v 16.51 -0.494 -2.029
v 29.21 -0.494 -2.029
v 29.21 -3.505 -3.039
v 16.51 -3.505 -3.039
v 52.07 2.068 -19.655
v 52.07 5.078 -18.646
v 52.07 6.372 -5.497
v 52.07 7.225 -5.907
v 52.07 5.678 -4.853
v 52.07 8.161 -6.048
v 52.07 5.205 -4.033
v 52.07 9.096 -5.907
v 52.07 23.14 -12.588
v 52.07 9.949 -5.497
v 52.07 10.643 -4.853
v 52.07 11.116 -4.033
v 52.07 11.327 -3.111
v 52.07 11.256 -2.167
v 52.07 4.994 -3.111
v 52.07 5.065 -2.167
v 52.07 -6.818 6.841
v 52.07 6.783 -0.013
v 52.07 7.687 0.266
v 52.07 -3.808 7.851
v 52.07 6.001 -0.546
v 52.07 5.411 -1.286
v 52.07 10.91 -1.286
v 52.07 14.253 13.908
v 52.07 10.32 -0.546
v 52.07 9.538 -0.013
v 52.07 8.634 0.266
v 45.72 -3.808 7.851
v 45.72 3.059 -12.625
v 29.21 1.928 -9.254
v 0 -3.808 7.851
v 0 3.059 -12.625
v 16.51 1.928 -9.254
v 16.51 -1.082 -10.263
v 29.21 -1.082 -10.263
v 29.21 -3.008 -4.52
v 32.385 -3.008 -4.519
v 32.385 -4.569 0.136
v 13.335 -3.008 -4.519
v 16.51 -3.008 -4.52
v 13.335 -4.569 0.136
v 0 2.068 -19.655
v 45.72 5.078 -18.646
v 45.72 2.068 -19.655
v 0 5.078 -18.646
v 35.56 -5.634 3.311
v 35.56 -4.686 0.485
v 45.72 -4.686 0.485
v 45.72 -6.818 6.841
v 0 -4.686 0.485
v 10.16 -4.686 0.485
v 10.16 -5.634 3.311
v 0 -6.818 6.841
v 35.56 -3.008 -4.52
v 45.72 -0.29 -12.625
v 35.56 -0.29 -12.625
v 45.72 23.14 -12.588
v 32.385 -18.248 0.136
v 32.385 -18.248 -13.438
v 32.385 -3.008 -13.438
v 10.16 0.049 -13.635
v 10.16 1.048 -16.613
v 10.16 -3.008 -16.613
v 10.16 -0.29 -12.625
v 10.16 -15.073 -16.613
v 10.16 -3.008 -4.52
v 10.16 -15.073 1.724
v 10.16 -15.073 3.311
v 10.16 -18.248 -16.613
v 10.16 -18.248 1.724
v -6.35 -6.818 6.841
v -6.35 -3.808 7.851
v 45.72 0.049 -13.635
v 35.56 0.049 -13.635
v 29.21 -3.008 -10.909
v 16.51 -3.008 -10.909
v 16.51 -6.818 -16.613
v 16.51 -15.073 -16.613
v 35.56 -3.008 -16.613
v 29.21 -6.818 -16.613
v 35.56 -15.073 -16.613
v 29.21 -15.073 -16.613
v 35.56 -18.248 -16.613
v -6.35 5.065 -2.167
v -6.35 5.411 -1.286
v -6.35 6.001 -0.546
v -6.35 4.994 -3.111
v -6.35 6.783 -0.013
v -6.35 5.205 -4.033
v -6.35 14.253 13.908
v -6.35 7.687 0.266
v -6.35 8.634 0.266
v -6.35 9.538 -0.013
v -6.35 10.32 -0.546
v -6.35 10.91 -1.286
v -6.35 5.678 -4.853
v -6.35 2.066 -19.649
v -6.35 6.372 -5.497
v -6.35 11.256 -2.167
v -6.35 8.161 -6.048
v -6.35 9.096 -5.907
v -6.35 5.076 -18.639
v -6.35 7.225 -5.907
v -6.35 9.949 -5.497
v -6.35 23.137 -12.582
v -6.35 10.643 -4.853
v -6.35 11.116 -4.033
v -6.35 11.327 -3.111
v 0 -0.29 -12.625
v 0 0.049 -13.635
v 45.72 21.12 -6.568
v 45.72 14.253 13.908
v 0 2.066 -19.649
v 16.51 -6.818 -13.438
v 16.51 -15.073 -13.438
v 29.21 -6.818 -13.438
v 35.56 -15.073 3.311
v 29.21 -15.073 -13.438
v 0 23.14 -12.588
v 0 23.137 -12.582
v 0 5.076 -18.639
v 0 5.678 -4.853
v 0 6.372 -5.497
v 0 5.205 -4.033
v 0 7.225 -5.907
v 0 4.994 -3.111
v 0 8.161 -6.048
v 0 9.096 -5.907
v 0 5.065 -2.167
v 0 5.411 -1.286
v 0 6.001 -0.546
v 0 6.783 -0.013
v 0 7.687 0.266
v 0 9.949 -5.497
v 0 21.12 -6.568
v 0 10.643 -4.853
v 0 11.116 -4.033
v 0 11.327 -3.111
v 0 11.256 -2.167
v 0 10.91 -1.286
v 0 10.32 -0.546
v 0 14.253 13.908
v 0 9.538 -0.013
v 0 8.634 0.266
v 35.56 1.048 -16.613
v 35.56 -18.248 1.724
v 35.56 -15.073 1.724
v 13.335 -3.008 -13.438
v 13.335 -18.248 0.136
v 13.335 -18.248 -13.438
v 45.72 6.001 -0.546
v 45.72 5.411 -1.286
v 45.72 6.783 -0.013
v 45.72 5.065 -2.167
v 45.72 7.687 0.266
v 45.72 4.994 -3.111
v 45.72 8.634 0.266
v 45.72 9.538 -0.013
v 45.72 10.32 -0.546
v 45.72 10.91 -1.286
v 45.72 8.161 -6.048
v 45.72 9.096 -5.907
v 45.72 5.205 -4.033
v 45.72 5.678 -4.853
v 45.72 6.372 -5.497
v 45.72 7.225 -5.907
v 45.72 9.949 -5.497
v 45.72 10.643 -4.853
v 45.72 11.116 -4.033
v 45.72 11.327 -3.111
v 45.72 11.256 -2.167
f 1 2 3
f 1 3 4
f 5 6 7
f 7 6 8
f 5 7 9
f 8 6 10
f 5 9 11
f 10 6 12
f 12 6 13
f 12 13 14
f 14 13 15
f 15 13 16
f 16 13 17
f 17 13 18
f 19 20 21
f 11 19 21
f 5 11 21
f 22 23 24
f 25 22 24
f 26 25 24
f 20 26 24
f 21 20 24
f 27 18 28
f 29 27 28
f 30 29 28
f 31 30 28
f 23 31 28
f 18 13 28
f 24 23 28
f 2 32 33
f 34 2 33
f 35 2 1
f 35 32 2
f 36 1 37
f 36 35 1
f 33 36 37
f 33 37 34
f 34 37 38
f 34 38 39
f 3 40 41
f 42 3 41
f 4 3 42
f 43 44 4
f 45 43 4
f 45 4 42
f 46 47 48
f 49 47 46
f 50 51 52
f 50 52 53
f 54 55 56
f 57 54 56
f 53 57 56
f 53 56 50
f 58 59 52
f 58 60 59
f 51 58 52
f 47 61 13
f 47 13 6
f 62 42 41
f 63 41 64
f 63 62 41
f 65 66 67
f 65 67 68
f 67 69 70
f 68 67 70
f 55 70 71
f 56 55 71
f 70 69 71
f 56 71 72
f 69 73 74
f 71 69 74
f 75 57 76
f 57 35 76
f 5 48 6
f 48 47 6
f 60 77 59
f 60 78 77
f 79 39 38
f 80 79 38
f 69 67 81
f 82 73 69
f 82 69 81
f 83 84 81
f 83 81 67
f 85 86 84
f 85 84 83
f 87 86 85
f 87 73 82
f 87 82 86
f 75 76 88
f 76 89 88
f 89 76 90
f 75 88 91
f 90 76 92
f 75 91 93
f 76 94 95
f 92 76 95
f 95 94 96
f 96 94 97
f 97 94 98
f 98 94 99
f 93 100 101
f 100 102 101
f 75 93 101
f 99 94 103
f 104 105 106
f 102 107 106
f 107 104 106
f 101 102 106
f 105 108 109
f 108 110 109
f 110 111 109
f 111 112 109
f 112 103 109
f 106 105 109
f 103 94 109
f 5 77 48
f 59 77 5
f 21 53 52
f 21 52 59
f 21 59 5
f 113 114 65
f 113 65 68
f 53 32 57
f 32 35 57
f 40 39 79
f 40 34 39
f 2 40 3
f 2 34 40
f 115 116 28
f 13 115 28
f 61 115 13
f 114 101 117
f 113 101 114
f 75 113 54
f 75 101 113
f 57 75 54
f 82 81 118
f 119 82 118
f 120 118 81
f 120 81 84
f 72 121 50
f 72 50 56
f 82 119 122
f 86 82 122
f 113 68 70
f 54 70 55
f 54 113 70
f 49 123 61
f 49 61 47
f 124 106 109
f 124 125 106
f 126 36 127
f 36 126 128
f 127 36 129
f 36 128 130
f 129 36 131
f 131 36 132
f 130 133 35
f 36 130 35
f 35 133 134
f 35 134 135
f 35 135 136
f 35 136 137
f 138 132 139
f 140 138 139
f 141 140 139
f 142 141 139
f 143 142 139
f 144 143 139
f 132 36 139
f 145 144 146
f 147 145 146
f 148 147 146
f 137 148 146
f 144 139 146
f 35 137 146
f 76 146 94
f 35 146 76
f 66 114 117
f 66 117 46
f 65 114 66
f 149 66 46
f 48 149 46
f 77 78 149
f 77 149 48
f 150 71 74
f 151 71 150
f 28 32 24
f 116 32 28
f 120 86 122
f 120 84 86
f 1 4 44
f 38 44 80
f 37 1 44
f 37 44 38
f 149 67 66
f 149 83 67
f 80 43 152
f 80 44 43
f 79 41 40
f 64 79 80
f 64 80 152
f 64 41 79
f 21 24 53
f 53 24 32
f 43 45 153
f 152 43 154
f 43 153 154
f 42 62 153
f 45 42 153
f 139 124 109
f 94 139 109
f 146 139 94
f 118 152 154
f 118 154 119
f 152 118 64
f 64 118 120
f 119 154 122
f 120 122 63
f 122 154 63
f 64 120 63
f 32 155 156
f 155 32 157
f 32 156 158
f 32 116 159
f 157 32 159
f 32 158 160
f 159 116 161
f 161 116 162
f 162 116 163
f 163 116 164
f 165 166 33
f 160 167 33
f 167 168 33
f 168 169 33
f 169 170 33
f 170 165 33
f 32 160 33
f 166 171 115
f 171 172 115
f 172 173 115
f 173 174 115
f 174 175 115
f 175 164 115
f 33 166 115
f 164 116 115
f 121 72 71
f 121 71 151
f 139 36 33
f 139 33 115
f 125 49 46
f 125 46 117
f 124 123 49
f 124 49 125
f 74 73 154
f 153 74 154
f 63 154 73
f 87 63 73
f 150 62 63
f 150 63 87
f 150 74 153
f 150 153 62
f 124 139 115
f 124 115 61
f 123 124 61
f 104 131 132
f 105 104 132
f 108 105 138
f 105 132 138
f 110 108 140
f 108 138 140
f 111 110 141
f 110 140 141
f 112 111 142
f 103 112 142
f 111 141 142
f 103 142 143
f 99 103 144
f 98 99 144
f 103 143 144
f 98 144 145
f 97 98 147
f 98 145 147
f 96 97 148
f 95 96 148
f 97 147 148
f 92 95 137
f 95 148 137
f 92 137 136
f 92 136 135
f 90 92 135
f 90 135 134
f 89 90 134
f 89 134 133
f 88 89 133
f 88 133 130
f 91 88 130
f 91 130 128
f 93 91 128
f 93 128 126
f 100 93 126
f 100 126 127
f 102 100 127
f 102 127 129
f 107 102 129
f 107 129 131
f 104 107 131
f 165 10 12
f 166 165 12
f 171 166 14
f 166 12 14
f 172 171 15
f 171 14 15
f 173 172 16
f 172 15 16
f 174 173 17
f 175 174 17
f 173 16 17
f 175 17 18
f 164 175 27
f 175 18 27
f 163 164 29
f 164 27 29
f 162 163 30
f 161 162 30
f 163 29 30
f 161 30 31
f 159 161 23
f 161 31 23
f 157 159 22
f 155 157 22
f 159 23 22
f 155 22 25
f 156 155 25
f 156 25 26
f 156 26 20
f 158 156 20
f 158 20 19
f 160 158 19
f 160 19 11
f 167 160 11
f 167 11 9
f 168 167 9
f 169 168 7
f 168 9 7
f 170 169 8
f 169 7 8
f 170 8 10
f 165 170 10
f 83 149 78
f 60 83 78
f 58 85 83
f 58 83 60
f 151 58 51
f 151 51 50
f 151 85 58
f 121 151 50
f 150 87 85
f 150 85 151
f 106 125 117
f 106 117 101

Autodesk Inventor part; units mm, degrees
ref_plane "YZ Plane" through (0, 0, 0) normal (1, 0, 0) x (0, 1, 0)
ref_plane "XZ Plane" through (0, 0, 0) normal (0, 1, 0) x (-1, 0, 0)
sketch "Sketch8" plane through (0, 0, 0) normal (1, 0, 0) x (0, 1, 0)
  line L0 (-3.8078, 7.851) -> (3.0591, -12.6251)
  line L1 (-0.2897, -12.6251) -> (-4.6863, 0.485)
  line L2 (3.0591, -12.6251) -> (-0.2897, -12.6251)
  line L3 (-4.6863, 0.485) -> (-6.818, 6.8414)
  line L4 (-3.8078, 7.851) -> (-6.818, 6.8414)
  point P0 (0, 0)
extrude "Extrusion6" add sketch "Sketch8" along normal blind 45.72
sketch "Sketch11" plane through (0, 0, 0) normal (-1, 0, 0) x (0, 0, 1)
  line L0 (0.485, -4.6863) -> (-12.6251, -0.2897) projected
  line L1 (7.851, -6.8159) -> (0.485, -6.8159) projected
  line L2 (7.851, -6.8159) -> (0.485, -6.8159)
  line L3 (0.485, -6.8159) -> (0.485, -4.6863)
  line L4 (-12.6251, -0.2897) -> (0.485, -4.6863)
  line L5 (7.851, -3.8078) -> (-12.6251, 3.0591) projected
  line L6 (0.485, -6.8159) -> (7.851, -6.8159) projected
  line L7 (13.9082, 14.2533) -> (7.851, -3.808)
  line L8 (7.851, -3.808) -> (-18.639, 5.076)
  line L9 (-18.639, 5.076) -> (-12.5817, 23.1373)
  line L10 (-12.5817, 23.1373) -> (13.9082, 14.2533)
  point P0 (0, 0)
  dimension "d73" = 27.94
  dimension "d74" = 18.54
  dimension "d76" = 0
  dimension "d88" = 19.05
extrude "Extrusion8" add sketch "Sketch11" along normal blind 6.35
sketch "Sketch13" plane through (0, -3.8078, 7.851) normal (0, 0.9481042, 0.3179598) x (1, 0, 0)
  line L0 (0, 0) -> (0, 21.5968) projected
  line L1 (16.51, 18.0408) -> (29.21, 18.0408)
  line L2 (29.21, 18.0408) -> (29.21, 10.4208)
  line L3 (29.21, 10.4208) -> (16.51, 10.4208)
  line L4 (16.51, 10.4208) -> (16.51, 18.0408)
  point P0 (0, 8.6543)
  dimension "d55" = 7.62
  dimension "d56" = 12.7
  dimension "d57" = 16.51
extrude "Extrusion10" cut sketch "Sketch13" against normal blind 25.4
sketch "Sketch15" plane through (0, 0, 0) normal (1, 0, 0) x (0, 0, -1)
  line L0 (-0.485, -6.8159) -> (-7.851, -6.8159) projected
  line L1 (6.5678, 21.1205) -> (12.5883, 23.1395)
  line L2 (12.5883, 23.1395) -> (18.6455, 5.0782)
  line L3 (18.6455, 5.0782) -> (12.6251, 3.0591)
  line L4 (12.6251, 3.0591) -> (6.5678, 21.1205)
  dimension "d67" = 6.35
  dimension "d68" = 18.54
  dimension "d69" = 0
  dimension "d70" = 0
  dimension "d87" = 19.05
extrude "Extrusion11" add sketch "Sketch15" along normal blind 45.72
sketch "Sketch17" plane through (45.72, 0, 0) normal (1, 0, 0) x (0, 0, -1)
  line L0 (-7.851, -3.808) -> (-13.9082, 14.2533) projected
  line L1 (-7.851, -3.808) -> (-13.9082, 14.2533)
  line L2 (-13.9082, 14.2533) -> (12.5883, 23.1395)
  line L3 (12.5883, 23.1395) -> (18.6456, 5.0782)
  line L4 (18.6456, 5.0782) -> (-7.851, -3.808)
  point P0 (0, 0)
extrude "Extrusion12" add sketch "Sketch17" along normal blind 6.35
sketch "Sketch19" plane through (45.72, 5.0782, -18.6456) normal (0, -0.9481019, -0.3179666) x (1, 0, 0)
  line L0 (0, 6.3501) -> (0, 0.0001) projected
  line L1 (6.35, 27.947) -> (0, 27.947)
  line L2 (0, 27.947) -> (0, 0.0001)
  line L3 (0, 0.0001) -> (6.35, 0.0001)
  line L4 (6.35, 0.0001) -> (6.35, 27.947)
  line L5 (-45.72, 6.3501) -> (0, 6.3501) projected
  line L6 (0, 0.0001) -> (0, 0.0001)
  line L7 (0, 0.0001) -> (0, 6.3501)
  line L8 (0, 6.3501) -> (0, 6.3501)
  line L9 (0, 6.3501) -> (0, 0.0001)
  line L10 (-45.72, 0.007) -> (-52.07, 0.007) projected
  line L11 (-52.07, 0.007) -> (-45.72, 0.007)
  line L12 (-45.72, 0.007) -> (-45.72, 27.947)
  line L13 (-45.72, 27.947) -> (-52.07, 27.947)
  line L14 (-52.07, 27.947) -> (-52.07, 0.007)
  point P0 (-45.72, 19.2926)
extrude "Extrusion13" add sketch "Sketch19" along normal blind 3.175
sketch "Sketch20" plane through (0, 5.0782, -18.6455) normal (0, -0.9481019, -0.3179666) x (1, 0, 0)
  line L0 (45.72, 0) -> (0, 0)
  line L1 (0, 0) -> (0, 6.35)
  line L2 (0, 6.35) -> (45.72, 6.35)
  line L3 (45.72, 6.35) -> (45.72, 0)
  point P0 (0, 19.2926)
extrude "Extrusion14" add sketch "Sketch20" along normal blind 3.175
sketch "Sketch21" plane through (0, 0, 0) normal (1, 0, 0) x (0, 0, -1)
  line L0 (19.6485, 2.0658) -> (13.6346, 0.0489) projected
  line L1 (13.6346, 0.0489) -> (12.6251, 3.0591) projected
  line L2 (12.6251, 3.0591) -> (12.6251, -0.2897) projected
  line L3 (12.6251, -0.2897) -> (-6.8414, -6.818) projected
  line L4 (-0.485, -4.6863) -> (-0.485, -4.6865) projected
  line L5 (19.6485, 2.0657) -> (-6.8414, -6.8182) projected
  line L6 (19.6485, 2.0657) -> (19.6485, 2.0658) projected
  line L7 (12.6251, 3.0591) -> (13.6346, 0.0489)
  line L8 (12.6251, -0.2897) -> (13.6346, 0.0489)
  line L9 (12.6251, 3.0591) -> (12.6251, -0.2897)
  point P0 (0, 0)
  point P1 (-6.8415, -6.8181)
extrude "Extrusion15" add sketch "Sketch21" along normal blind 45.72
sketch "Sketch22" plane through (16.51, -1.0818, -10.2631) normal (0, 0.9481042, 0.3179598) x (1, 0, 0)
  line L0 (12.7, -7.62) -> (12.7, 0) projected
  line L1 (12.7, 0) -> (0, 0) projected
  line L2 (0, 0) -> (12.7, 0)
  line L3 (12.7, 0) -> (12.7, -7.62)
  line L4 (12.7, -7.62) -> (0, -7.62)
  line L5 (0, -7.62) -> (0, 0)
  point P0 (-16.51, -9.3866)
extrude "Extrusion16" cut sketch "Sketch22" against normal blind 45.72
sketch "Sketch23" plane through (52.07, 0, 0) normal (1, 0, 0) x (0, 0, -1)
  circle A0 centre (2.8734, 8.1606) radius 3.175
  point P0 (0, 0)
  dimension "d89" = 6.35
extrude "Extrusion17" cut sketch "Sketch23" against normal blind 76.2
ref_plane "Work Plane1" through (0, -6.818, 6.8414) normal (0, -1, 0) x (1, 0, 0)
sketch "Sketch25" plane through (0, -6.818, 6.8414) normal (0, -1, 0) x (1, 0, 0)
  line L0 (35.56, -20.2796) -> (35.56, -3.5301)
  line L1 (35.56, -3.5301) -> (32.385, -3.5301)
  line L2 (32.385, -3.5301) -> (32.385, -20.2796)
  line L3 (32.385, -6.7051) -> (10.16, -6.7051)
  line L4 (10.16, -6.7051) -> (10.16, -3.5301)
  line L5 (10.16, -3.5301) -> (32.385, -3.5301)
  line L6 (32.385, -3.5301) -> (32.385, -6.7051)
  line L7 (10.16, -6.7051) -> (13.335, -6.7051)
  line L8 (13.335, -6.7051) -> (13.335, -20.2796)
  line L9 (10.16, -20.2796) -> (10.16, -6.7051)
  line L10 (13.335, -20.2796) -> (32.385, -20.2796)
  line L11 (32.385, -20.2796) -> (32.385, -23.4546)
  line L12 (32.385, -23.4546) -> (13.335, -23.4546)
  line L13 (13.335, -23.4546) -> (13.335, -20.2796)
  line L14 (29.21, -17.1046) -> (16.51, -17.1046) projected
  line L15 (29.21, -9.8801) -> (29.21, -17.1046) projected
  line L16 (16.51, -9.8801) -> (29.21, -9.8801) projected
  line L17 (16.51, -17.1046) -> (16.51, -9.8801) projected
  line L18 (32.385, -23.4546) -> (35.56, -23.4546)
  line L19 (35.56, -23.4546) -> (35.56, -3.5301)
  line L20 (35.56, -3.5301) -> (32.385, -3.5301)
  line L21 (32.385, -3.5301) -> (32.385, -23.4546)
  line L22 (32.385, -3.5301) -> (10.16, -3.5301)
  line L23 (10.16, -3.5301) -> (10.16, -6.7051)
  line L24 (10.16, -6.7051) -> (32.385, -6.7051)
  line L25 (32.385, -6.7051) -> (32.385, -3.5301)
  line L26 (10.16, -6.7051) -> (13.335, -6.7051)
  line L27 (13.335, -6.7051) -> (13.335, -23.4546)
  line L28 (13.335, -23.4546) -> (10.16, -23.4546)
  line L29 (10.16, -23.4546) -> (10.16, -6.7051)
  line L30 (32.385, -20.2796) -> (13.335, -20.2796)
  line L31 (13.335, -20.2796) -> (13.335, -23.4546)
  line L32 (13.335, -23.4546) -> (32.385, -23.4546)
  line L33 (32.385, -23.4546) -> (32.385, -20.2796)
  line L34 (35.56, -3.5301) -> (32.385, -3.5301)
  line L35 (32.385, -3.5301) -> (32.385, -23.4546)
  line L36 (32.385, -23.4546) -> (35.56, -23.4546)
  line L37 (35.56, -23.4546) -> (35.56, -3.5301)
  point P0 (0, -6.8414)
  dimension "d102" = 3.175
  dimension "d103" = 3.175
  dimension "d104" = 3.175
  dimension "d105" = 3.175
  dimension "d106" = 3.175
  dimension "d107" = 3.175
  dimension "d108" = 3.175
  dimension "d109" = 3.175
extrude "Extrusion18" add sketch "Sketch25" against normal blind 3.81 contours L19 L18 L11 L2 L1 L0 | L2 L3 L4 L5 | L12 L13 L10 L11 | L28 L29 L9 L3 L8 L13
sketch "Sketch26" plane through (35.56, -6.818, 3.3114) normal (1, 0, 0) x (0, 0, -1)
  line L0 (7.8311, 3.81) -> (19.9245, 3.81) projected
  line L1 (7.8311, 3.81) -> (19.9245, 3.81)
  line L2 (19.9245, 3.81) -> (19.9245, 7.8658)
  line L3 (19.9245, 7.8658) -> (7.8311, 3.81)
  point P0 (3.3114, 6.818)
extrude "Extrusion19" add sketch "Sketch26" against normal blind 25.4
sketch "Sketch27" plane through (16.51, -1.0818, -10.2632) normal (0, 0.9481013, 0.3179684) x (1, 0, 0)
  line L0 (0, -6.0578) -> (12.7, -6.0578)
  line L1 (12.7, -6.0578) -> (12.7, 0)
  line L2 (12.7, 0) -> (0, 0)
  line L3 (0, 0) -> (0, -6.0578)
  point P0 (-16.51, -9.3865)
extrude "Extrusion20" cut sketch "Sketch27" against normal blind 25.4
sketch "Sketch28" plane through (0, -6.818, 6.8414) normal (0, -1, 0) x (1, 0, 0)
  line L0 (10.16, -3.5301) -> (10.16, -23.4546) projected
  line L1 (35.56, -23.4546) -> (35.56, -3.5301) projected
  line L2 (35.56, -3.5301) -> (10.16, -3.5301) projected
  line L3 (32.385, -6.7051) -> (13.335, -6.7051) projected
  line L4 (32.385, -6.7051) -> (32.385, -20.2796) projected
  line L5 (32.385, -20.2796) -> (13.335, -20.2796) projected
  line L6 (13.335, -20.2796) -> (13.335, -6.7051) projected
  line L7 (35.56, -23.4546) -> (29.21, -23.4546)
  line L8 (29.21, -23.4546) -> (29.21, -20.2796)
  line L9 (29.21, -20.2796) -> (35.56, -20.2796)
  line L10 (35.56, -20.2796) -> (35.56, -23.4546)
  line L11 (10.16, -23.4546) -> (16.51, -23.4546)
  line L12 (16.51, -23.4546) -> (16.51, -20.2796)
  line L13 (16.51, -20.2796) -> (10.16, -20.2796)
  line L14 (10.16, -20.2796) -> (10.16, -23.4546)
  line L15 (13.335, -6.7051) -> (13.335, -11.3612) projected
  line L16 (10.16, -20.2796) -> (13.335, -20.2796)
  line L17 (13.335, -20.2796) -> (13.335, -6.7051)
  line L18 (13.335, -6.7051) -> (10.16, -6.7051)
  line L19 (10.16, -6.7051) -> (10.16, -20.2796)
  line L20 (10.16, -3.5301) -> (35.56, -3.5301) projected
  line L21 (10.16, -6.7051) -> (35.56, -6.7051)
  line L22 (35.56, -6.7051) -> (35.56, -3.5301)
  line L23 (35.56, -3.5301) -> (10.16, -3.5301)
  line L24 (10.16, -3.5301) -> (10.16, -6.7051)
  line L25 (35.56, -6.7051) -> (32.385, -6.7051)
  line L26 (32.385, -6.7051) -> (32.385, -20.2796)
  line L27 (32.385, -20.2796) -> (35.56, -20.2796)
  line L28 (35.56, -20.2796) -> (35.56, -6.7051)
  point P0 (0, -6.8414)
  dimension "d116" = 6.35
  dimension "d117" = 6.35
extrude "Extrusion21" add sketch "Sketch28" along normal blind 8.255 contours L2 L1 L21 L3 L18 L0 | L18 L6 L13 L0 | L13 L5 L12 L11 L0 | L1 L9 L4 L21 | L1 L7 L8 L5 L9
sketch "Sketch29" plane through (0, -15.073, 6.8414) normal (0, -1, 0) x (1, 0, 0)
  line L0 (35.56, -6.3565) -> (35.56, -23.4546) projected
  line L1 (10.16, -23.4546) -> (35.56, -23.4546)
  line L2 (35.56, -23.4546) -> (35.56, -20.2796)
  line L3 (35.56, -20.2796) -> (10.16, -20.2796)
  line L4 (10.16, -20.2796) -> (10.16, -23.4546)
  line L5 (10.16, -23.4546) -> (10.16, -6.3565) projected
  line L6 (10.16, -6.7051) -> (35.56, -6.7051)
  line L7 (35.56, -6.7051) -> (32.385, -6.7051)
  line L8 (32.385, -6.7051) -> (32.385, -20.2796)
  line L9 (32.385, -20.2796) -> (35.56, -20.2796)
  line L10 (35.56, -20.2796) -> (35.56, -6.7051)
  line L11 (13.335, -6.7051) -> (10.16, -6.7051)
  line L12 (10.16, -6.7051) -> (10.16, -20.2796)
  line L13 (10.16, -20.2796) -> (13.335, -20.2796)
  line L14 (13.335, -20.2796) -> (13.335, -6.7051)
  line L15 (10.16, -6.3565) -> (10.16, -3.5301) projected
  line L16 (35.56, -6.7051) -> (10.16, -6.7051)
  line L17 (10.16, -6.7051) -> (10.16, -5.1176)
  line L18 (10.16, -5.1176) -> (35.56, -5.1176)
  line L19 (35.56, -5.1176) -> (35.56, -6.7051)
  point P0 (35.56, -3.5301)
  point P1 (0, -6.8414)
  dimension "d124" = 1.5875
extrude "Extrusion22" add sketch "Sketch29" along normal blind 3.175 contours L0 L6 L5 L15 L18 L19 | L0 L3 L8 L6 | L0 L1 L4 L3 | L14 L3 L5 L6
equation "\"d57\" = d58"
equation "\"d58\" = 16.51"
properties part number "Lidar Sensor Case v2"
